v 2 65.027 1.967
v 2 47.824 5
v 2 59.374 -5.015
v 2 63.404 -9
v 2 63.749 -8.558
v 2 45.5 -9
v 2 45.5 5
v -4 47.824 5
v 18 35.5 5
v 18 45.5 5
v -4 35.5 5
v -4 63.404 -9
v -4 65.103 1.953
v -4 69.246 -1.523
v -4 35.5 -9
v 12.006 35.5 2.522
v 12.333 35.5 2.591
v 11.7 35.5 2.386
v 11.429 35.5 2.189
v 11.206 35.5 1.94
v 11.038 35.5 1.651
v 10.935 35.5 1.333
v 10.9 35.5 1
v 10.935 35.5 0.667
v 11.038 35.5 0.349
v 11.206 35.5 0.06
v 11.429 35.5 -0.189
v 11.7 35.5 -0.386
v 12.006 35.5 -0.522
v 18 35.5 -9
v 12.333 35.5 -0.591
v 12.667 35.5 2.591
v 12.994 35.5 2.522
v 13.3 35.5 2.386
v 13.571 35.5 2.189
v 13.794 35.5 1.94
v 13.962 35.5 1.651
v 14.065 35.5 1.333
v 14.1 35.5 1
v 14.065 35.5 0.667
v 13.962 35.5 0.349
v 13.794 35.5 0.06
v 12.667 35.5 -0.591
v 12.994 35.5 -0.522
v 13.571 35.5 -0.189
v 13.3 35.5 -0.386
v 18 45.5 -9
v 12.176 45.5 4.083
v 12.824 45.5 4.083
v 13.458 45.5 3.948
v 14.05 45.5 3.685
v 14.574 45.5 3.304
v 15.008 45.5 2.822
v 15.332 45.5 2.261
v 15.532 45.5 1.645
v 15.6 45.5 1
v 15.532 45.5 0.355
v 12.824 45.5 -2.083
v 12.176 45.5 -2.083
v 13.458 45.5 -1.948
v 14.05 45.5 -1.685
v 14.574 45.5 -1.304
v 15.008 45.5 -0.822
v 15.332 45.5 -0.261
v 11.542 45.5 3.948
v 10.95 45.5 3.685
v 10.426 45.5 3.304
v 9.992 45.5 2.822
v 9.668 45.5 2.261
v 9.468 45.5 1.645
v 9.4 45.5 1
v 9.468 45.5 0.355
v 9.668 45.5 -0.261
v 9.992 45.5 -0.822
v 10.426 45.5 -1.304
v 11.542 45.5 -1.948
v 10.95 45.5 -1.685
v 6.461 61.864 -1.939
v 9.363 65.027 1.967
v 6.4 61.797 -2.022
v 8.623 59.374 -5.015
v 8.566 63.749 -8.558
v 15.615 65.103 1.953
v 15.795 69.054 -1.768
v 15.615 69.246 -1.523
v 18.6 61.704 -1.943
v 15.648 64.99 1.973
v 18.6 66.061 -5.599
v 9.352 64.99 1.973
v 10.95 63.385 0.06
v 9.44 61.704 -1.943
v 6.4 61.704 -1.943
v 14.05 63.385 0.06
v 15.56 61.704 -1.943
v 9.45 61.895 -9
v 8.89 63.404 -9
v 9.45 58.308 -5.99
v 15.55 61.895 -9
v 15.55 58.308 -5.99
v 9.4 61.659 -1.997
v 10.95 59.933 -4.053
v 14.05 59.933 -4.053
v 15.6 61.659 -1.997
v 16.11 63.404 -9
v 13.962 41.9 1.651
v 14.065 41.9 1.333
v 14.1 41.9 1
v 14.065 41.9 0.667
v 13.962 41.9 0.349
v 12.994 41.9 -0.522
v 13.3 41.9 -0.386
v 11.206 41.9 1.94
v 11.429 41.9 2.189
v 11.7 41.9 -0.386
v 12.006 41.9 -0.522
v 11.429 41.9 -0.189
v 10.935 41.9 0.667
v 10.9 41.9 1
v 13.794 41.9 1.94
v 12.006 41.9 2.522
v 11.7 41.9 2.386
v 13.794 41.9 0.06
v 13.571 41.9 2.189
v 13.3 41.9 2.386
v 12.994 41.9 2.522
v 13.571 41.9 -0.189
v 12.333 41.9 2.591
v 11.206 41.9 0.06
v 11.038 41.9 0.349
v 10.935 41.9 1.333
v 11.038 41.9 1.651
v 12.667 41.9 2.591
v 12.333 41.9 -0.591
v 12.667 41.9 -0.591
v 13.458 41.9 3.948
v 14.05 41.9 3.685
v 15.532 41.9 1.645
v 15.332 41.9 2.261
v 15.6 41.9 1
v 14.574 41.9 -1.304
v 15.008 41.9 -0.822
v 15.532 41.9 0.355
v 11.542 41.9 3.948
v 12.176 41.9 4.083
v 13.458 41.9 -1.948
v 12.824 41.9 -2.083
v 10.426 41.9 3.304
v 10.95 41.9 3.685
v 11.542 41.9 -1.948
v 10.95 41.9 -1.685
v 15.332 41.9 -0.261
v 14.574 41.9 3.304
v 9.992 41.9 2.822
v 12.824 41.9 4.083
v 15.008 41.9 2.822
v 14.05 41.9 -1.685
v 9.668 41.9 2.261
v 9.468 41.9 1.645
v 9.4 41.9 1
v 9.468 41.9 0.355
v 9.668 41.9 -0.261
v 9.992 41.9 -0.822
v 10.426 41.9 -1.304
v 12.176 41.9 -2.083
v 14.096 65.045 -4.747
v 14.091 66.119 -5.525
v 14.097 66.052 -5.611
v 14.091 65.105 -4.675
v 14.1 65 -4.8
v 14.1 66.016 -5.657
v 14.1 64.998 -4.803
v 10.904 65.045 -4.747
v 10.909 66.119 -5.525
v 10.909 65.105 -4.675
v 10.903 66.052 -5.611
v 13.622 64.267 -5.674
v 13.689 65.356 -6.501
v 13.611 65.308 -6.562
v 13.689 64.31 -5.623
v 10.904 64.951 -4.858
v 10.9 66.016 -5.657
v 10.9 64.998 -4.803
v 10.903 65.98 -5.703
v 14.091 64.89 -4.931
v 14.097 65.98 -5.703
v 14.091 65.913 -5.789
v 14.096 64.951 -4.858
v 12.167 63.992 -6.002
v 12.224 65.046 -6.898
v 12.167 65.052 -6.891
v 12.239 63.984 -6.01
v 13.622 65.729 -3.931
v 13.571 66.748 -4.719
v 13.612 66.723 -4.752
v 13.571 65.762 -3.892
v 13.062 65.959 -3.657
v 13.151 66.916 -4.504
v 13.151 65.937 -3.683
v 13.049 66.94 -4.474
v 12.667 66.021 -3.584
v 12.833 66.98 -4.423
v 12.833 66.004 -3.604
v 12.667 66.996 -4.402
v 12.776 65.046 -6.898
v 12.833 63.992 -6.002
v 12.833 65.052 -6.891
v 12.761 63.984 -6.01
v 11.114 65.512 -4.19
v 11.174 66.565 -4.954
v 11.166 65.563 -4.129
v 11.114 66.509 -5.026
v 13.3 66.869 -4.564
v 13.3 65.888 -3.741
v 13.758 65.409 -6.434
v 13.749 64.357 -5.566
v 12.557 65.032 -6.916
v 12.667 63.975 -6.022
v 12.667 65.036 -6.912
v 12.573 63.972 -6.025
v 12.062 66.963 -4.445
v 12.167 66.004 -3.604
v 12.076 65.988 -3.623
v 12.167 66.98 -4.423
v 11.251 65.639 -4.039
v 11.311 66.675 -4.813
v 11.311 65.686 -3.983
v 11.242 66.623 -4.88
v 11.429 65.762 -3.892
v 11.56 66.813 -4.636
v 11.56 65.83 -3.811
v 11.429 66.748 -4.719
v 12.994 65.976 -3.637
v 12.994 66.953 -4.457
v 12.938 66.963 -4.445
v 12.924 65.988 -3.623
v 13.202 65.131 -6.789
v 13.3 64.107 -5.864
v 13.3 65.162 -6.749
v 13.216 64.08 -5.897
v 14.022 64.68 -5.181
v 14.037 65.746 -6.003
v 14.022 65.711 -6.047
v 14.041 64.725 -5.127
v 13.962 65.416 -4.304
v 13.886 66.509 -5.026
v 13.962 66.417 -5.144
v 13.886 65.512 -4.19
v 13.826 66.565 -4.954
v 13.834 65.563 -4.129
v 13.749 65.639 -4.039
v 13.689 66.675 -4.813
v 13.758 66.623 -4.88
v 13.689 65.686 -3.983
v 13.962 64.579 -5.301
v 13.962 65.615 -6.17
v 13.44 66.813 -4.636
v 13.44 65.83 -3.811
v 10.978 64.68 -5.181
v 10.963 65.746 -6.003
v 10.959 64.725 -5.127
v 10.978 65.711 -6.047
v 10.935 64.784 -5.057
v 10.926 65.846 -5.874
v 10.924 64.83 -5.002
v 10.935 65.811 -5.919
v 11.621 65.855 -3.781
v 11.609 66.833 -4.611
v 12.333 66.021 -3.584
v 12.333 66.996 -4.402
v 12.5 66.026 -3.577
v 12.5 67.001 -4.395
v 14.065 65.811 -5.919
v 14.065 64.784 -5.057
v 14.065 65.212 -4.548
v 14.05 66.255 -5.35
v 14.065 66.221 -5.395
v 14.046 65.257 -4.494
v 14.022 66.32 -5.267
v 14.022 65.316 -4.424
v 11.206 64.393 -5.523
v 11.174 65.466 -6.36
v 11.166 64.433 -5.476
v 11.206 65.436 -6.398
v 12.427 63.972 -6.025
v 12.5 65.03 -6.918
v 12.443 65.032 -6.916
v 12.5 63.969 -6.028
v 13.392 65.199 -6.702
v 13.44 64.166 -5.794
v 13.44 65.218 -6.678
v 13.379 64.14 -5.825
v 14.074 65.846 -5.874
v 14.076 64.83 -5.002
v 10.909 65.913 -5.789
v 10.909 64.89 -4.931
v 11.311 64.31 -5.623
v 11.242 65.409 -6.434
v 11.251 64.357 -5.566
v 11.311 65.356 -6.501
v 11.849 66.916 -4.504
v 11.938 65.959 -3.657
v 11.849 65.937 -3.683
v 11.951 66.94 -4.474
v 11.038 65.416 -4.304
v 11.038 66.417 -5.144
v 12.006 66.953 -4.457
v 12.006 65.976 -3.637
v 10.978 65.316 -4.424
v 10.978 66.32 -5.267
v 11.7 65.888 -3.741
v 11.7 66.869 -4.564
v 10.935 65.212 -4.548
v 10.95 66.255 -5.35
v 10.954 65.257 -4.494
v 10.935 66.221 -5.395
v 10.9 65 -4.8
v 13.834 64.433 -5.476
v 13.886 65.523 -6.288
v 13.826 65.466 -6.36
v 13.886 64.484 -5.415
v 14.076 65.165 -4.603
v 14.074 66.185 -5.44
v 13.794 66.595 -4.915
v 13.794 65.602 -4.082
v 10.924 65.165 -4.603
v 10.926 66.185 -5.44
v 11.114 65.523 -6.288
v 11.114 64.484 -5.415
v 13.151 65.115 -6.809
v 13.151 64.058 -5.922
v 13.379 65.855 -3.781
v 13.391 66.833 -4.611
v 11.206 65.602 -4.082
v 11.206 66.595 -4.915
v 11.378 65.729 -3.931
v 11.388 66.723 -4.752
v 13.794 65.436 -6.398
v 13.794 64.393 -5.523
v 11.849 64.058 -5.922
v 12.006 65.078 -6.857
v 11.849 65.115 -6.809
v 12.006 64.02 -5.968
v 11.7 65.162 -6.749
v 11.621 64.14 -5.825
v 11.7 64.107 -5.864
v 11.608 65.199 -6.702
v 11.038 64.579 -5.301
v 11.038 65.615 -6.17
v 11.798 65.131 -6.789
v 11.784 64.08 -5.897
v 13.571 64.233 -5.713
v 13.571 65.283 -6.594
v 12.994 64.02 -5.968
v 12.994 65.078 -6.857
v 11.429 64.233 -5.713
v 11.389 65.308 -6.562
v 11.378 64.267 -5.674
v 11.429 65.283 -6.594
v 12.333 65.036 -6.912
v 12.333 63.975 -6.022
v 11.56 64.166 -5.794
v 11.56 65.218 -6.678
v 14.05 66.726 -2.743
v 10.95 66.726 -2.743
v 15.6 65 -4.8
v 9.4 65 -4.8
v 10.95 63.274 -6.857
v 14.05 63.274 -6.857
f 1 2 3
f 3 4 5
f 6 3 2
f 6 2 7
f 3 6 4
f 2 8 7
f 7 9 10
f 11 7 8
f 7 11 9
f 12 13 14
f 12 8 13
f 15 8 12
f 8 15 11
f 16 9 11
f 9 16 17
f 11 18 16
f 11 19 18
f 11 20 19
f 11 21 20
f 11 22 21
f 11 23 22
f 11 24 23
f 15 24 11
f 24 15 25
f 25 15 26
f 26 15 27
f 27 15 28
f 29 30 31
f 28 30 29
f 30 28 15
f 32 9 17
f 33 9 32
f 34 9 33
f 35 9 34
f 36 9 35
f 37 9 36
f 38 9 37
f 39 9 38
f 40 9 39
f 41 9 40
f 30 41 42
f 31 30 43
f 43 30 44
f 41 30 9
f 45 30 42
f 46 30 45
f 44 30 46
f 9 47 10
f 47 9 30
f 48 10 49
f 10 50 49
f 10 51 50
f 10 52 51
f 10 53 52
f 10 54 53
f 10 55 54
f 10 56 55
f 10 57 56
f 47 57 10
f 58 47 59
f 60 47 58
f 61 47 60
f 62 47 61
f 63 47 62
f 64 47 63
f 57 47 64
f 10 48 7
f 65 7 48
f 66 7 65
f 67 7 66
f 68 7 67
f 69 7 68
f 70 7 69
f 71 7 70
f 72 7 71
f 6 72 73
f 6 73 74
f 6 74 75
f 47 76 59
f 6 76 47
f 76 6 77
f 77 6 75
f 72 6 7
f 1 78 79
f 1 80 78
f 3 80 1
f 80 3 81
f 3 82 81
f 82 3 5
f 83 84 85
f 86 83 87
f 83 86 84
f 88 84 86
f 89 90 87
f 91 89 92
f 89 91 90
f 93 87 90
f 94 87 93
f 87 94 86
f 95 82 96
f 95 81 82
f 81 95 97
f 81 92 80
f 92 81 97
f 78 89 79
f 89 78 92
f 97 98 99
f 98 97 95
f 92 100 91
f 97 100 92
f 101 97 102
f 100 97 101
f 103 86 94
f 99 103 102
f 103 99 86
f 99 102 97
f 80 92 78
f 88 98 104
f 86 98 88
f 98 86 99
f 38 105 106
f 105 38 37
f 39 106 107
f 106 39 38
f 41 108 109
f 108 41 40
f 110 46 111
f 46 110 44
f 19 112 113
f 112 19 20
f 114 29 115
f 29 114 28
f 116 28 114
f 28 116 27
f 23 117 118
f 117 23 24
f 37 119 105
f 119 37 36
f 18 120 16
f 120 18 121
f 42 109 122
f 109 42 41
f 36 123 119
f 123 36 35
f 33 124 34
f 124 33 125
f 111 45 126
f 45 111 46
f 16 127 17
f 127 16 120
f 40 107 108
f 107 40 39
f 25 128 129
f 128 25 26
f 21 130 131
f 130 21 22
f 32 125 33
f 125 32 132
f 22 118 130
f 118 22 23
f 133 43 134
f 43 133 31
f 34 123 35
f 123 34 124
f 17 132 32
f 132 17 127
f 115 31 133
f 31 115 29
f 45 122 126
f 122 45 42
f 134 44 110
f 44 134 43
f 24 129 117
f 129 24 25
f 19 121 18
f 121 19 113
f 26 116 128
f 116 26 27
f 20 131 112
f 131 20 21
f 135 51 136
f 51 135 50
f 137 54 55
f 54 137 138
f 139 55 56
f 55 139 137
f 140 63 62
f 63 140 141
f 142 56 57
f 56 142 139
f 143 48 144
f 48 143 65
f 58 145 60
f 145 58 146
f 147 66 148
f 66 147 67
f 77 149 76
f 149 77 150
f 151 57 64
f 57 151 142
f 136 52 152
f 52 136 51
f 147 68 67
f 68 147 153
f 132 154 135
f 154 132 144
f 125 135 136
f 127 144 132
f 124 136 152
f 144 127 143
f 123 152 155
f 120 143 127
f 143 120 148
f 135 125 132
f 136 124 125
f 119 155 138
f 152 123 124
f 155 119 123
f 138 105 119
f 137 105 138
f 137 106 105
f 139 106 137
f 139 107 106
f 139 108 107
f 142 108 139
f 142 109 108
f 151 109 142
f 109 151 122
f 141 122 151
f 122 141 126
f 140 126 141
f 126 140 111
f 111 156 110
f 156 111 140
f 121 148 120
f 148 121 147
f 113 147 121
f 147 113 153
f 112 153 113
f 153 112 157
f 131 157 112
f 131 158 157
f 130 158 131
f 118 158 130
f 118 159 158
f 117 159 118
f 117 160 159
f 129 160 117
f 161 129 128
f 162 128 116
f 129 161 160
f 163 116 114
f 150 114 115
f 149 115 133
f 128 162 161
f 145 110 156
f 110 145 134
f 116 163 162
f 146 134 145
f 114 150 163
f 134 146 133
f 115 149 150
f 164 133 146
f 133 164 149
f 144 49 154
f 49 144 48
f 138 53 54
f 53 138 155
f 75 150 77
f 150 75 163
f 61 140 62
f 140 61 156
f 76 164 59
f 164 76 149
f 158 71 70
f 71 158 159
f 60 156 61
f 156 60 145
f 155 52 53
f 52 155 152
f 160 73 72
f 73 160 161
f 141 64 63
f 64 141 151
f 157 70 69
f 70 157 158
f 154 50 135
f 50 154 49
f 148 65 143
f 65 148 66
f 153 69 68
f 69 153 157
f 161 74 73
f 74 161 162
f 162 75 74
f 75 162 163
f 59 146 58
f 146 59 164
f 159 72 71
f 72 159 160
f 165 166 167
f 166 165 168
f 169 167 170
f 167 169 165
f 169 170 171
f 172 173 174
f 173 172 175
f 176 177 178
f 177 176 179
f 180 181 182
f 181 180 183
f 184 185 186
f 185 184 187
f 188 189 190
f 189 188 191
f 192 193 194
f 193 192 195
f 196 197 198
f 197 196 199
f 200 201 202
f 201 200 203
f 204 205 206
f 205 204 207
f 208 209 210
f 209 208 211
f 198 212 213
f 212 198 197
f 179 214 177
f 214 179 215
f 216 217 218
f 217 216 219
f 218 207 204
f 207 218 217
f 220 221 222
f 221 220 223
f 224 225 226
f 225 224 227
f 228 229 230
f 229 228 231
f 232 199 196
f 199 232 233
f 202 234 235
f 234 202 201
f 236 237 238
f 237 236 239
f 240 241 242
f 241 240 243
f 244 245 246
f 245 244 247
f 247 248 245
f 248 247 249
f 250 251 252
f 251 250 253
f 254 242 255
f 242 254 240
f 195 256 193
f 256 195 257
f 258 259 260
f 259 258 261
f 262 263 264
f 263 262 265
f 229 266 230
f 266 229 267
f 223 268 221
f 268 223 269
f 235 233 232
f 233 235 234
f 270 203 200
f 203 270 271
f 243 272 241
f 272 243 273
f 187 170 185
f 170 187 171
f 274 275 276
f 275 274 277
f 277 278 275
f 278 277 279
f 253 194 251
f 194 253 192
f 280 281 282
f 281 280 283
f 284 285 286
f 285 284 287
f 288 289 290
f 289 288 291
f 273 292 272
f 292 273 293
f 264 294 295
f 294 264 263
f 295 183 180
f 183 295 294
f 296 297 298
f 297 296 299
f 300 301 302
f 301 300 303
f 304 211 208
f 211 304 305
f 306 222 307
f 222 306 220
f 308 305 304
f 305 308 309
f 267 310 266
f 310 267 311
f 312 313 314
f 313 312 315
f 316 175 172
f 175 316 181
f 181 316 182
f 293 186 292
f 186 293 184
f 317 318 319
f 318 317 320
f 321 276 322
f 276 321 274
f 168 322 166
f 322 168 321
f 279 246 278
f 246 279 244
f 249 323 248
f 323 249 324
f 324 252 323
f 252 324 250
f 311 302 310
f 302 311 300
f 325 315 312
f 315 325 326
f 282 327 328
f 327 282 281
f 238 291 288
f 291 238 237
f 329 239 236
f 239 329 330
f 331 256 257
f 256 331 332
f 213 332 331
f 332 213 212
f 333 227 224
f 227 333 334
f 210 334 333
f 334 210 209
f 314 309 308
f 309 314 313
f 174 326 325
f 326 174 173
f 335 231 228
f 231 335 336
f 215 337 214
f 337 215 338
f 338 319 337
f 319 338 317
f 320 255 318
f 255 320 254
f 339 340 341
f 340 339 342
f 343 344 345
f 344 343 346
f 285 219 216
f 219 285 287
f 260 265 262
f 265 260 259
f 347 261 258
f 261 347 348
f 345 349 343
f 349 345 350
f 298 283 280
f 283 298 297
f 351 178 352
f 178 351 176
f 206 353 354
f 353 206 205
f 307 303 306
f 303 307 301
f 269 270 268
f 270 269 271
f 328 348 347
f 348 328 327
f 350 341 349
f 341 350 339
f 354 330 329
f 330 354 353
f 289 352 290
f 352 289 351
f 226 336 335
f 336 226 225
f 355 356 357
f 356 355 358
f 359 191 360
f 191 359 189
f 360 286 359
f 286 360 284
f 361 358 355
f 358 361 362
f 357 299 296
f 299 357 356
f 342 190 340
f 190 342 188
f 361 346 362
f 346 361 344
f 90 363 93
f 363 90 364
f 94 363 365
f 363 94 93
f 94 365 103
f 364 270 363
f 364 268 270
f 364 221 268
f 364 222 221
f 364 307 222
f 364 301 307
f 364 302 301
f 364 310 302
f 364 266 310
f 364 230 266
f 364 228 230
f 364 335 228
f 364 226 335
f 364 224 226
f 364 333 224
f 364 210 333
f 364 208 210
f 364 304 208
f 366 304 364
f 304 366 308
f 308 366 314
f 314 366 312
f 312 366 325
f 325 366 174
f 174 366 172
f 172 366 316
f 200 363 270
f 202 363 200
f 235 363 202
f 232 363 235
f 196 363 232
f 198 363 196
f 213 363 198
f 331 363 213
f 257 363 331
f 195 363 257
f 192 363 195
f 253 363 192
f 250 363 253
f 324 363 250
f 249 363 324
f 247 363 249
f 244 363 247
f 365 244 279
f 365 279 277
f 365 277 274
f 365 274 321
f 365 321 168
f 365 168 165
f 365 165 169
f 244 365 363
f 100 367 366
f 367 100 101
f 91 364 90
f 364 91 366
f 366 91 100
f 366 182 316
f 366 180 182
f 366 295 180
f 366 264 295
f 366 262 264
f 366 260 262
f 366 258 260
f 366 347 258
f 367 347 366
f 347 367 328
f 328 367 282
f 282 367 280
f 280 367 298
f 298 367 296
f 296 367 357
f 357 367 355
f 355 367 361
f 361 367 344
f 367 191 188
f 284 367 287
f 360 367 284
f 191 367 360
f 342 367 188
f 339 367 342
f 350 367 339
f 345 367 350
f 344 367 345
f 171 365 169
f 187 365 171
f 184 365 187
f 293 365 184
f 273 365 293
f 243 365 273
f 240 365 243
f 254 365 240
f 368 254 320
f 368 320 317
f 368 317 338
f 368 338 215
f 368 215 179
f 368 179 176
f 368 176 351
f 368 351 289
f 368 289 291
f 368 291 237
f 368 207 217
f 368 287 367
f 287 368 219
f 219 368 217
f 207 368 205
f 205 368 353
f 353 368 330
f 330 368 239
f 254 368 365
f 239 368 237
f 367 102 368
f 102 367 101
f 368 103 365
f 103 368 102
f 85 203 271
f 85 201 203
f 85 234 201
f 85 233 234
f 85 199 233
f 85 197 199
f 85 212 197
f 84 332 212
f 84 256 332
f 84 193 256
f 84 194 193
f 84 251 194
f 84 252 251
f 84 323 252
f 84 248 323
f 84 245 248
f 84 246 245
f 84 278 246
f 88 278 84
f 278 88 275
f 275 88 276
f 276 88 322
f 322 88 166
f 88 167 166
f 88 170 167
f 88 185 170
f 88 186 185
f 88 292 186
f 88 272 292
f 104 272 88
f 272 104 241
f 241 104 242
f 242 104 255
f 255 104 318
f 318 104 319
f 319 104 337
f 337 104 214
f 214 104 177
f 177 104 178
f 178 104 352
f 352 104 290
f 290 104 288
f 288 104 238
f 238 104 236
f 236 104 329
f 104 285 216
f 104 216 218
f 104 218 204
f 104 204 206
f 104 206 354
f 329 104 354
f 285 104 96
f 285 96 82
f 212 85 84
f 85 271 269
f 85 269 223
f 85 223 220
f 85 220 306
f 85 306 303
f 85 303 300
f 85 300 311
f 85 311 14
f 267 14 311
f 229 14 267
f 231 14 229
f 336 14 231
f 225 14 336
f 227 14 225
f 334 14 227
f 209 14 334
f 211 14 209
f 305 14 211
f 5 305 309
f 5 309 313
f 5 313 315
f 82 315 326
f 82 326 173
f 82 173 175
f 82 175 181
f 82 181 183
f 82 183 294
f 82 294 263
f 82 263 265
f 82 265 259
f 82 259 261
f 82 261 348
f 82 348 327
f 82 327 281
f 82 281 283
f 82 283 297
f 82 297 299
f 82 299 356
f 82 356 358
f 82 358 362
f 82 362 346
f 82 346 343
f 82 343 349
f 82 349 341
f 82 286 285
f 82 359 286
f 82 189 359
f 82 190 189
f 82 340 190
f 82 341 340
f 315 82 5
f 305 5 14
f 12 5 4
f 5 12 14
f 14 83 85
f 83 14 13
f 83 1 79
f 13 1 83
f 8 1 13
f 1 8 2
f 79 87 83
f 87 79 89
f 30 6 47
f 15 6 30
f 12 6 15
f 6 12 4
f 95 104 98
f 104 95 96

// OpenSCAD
//#import("nozzle-fan.stl");
//#translate([0,-4.5,0]) rotate([90,0,180]) import("extruder-body.stl");
//translate([0,-4.5,0]) rotate([90,0,0]) import("extruder-cover.stl");
//translate([0,0,0]) rotate([0,0,0]) import("hot21_45_2.stl");
//use<nozzle-fan-old.scad>;
//%rotate([90,0,0]) fan_nozzle_old();


difference()
{
union()
{
    translate([-4,35.5,-25]) cube([6,45,30]);
    translate([-4,35.5,-25]) cube([22,10,30]);
    translate([-4,68,-12]) rotate([51,0,0]) cube([17,15,11.1]);
    translate([12.5,66.3,-5.8]) rotate([50,0,0])  cylinder(r=6.1,h = 6, $fn=6);
}


translate([12.5,42,1]) rotate([90,0,0])  cylinder(r=1.6,h = 10, $fn=30);
translate([12.5,46.9,1]) rotate([90,0,0])  cylinder(r=3.1,h = 5, $fn=30);

translate([12.5,70,-9]) rotate([50,0,0])  cylinder(r=1.6,h = 15, $fn=60);
translate([12.5,65,-4.8]) rotate([50,0,0])  cylinder(r=3.1,h = 17, $fn=6);


translate([-25,46.5,-55]) rotate([52,0,0]) cube([50,150,15]);
translate([-25,46.5,-66]) rotate([50,0,0]) cube([50,150,15]);
translate([-25,86,4]) rotate([50+90,0,0]) cube([50,150,15]);
translate([-25,86,13.5]) rotate([170,0,0]) cube([50,150,15]);
translate([-25,86,-9]) rotate([180,0,0]) cube([50,150,20]);

translate([-5,35,-25]) cube([20,45,16]);

}
